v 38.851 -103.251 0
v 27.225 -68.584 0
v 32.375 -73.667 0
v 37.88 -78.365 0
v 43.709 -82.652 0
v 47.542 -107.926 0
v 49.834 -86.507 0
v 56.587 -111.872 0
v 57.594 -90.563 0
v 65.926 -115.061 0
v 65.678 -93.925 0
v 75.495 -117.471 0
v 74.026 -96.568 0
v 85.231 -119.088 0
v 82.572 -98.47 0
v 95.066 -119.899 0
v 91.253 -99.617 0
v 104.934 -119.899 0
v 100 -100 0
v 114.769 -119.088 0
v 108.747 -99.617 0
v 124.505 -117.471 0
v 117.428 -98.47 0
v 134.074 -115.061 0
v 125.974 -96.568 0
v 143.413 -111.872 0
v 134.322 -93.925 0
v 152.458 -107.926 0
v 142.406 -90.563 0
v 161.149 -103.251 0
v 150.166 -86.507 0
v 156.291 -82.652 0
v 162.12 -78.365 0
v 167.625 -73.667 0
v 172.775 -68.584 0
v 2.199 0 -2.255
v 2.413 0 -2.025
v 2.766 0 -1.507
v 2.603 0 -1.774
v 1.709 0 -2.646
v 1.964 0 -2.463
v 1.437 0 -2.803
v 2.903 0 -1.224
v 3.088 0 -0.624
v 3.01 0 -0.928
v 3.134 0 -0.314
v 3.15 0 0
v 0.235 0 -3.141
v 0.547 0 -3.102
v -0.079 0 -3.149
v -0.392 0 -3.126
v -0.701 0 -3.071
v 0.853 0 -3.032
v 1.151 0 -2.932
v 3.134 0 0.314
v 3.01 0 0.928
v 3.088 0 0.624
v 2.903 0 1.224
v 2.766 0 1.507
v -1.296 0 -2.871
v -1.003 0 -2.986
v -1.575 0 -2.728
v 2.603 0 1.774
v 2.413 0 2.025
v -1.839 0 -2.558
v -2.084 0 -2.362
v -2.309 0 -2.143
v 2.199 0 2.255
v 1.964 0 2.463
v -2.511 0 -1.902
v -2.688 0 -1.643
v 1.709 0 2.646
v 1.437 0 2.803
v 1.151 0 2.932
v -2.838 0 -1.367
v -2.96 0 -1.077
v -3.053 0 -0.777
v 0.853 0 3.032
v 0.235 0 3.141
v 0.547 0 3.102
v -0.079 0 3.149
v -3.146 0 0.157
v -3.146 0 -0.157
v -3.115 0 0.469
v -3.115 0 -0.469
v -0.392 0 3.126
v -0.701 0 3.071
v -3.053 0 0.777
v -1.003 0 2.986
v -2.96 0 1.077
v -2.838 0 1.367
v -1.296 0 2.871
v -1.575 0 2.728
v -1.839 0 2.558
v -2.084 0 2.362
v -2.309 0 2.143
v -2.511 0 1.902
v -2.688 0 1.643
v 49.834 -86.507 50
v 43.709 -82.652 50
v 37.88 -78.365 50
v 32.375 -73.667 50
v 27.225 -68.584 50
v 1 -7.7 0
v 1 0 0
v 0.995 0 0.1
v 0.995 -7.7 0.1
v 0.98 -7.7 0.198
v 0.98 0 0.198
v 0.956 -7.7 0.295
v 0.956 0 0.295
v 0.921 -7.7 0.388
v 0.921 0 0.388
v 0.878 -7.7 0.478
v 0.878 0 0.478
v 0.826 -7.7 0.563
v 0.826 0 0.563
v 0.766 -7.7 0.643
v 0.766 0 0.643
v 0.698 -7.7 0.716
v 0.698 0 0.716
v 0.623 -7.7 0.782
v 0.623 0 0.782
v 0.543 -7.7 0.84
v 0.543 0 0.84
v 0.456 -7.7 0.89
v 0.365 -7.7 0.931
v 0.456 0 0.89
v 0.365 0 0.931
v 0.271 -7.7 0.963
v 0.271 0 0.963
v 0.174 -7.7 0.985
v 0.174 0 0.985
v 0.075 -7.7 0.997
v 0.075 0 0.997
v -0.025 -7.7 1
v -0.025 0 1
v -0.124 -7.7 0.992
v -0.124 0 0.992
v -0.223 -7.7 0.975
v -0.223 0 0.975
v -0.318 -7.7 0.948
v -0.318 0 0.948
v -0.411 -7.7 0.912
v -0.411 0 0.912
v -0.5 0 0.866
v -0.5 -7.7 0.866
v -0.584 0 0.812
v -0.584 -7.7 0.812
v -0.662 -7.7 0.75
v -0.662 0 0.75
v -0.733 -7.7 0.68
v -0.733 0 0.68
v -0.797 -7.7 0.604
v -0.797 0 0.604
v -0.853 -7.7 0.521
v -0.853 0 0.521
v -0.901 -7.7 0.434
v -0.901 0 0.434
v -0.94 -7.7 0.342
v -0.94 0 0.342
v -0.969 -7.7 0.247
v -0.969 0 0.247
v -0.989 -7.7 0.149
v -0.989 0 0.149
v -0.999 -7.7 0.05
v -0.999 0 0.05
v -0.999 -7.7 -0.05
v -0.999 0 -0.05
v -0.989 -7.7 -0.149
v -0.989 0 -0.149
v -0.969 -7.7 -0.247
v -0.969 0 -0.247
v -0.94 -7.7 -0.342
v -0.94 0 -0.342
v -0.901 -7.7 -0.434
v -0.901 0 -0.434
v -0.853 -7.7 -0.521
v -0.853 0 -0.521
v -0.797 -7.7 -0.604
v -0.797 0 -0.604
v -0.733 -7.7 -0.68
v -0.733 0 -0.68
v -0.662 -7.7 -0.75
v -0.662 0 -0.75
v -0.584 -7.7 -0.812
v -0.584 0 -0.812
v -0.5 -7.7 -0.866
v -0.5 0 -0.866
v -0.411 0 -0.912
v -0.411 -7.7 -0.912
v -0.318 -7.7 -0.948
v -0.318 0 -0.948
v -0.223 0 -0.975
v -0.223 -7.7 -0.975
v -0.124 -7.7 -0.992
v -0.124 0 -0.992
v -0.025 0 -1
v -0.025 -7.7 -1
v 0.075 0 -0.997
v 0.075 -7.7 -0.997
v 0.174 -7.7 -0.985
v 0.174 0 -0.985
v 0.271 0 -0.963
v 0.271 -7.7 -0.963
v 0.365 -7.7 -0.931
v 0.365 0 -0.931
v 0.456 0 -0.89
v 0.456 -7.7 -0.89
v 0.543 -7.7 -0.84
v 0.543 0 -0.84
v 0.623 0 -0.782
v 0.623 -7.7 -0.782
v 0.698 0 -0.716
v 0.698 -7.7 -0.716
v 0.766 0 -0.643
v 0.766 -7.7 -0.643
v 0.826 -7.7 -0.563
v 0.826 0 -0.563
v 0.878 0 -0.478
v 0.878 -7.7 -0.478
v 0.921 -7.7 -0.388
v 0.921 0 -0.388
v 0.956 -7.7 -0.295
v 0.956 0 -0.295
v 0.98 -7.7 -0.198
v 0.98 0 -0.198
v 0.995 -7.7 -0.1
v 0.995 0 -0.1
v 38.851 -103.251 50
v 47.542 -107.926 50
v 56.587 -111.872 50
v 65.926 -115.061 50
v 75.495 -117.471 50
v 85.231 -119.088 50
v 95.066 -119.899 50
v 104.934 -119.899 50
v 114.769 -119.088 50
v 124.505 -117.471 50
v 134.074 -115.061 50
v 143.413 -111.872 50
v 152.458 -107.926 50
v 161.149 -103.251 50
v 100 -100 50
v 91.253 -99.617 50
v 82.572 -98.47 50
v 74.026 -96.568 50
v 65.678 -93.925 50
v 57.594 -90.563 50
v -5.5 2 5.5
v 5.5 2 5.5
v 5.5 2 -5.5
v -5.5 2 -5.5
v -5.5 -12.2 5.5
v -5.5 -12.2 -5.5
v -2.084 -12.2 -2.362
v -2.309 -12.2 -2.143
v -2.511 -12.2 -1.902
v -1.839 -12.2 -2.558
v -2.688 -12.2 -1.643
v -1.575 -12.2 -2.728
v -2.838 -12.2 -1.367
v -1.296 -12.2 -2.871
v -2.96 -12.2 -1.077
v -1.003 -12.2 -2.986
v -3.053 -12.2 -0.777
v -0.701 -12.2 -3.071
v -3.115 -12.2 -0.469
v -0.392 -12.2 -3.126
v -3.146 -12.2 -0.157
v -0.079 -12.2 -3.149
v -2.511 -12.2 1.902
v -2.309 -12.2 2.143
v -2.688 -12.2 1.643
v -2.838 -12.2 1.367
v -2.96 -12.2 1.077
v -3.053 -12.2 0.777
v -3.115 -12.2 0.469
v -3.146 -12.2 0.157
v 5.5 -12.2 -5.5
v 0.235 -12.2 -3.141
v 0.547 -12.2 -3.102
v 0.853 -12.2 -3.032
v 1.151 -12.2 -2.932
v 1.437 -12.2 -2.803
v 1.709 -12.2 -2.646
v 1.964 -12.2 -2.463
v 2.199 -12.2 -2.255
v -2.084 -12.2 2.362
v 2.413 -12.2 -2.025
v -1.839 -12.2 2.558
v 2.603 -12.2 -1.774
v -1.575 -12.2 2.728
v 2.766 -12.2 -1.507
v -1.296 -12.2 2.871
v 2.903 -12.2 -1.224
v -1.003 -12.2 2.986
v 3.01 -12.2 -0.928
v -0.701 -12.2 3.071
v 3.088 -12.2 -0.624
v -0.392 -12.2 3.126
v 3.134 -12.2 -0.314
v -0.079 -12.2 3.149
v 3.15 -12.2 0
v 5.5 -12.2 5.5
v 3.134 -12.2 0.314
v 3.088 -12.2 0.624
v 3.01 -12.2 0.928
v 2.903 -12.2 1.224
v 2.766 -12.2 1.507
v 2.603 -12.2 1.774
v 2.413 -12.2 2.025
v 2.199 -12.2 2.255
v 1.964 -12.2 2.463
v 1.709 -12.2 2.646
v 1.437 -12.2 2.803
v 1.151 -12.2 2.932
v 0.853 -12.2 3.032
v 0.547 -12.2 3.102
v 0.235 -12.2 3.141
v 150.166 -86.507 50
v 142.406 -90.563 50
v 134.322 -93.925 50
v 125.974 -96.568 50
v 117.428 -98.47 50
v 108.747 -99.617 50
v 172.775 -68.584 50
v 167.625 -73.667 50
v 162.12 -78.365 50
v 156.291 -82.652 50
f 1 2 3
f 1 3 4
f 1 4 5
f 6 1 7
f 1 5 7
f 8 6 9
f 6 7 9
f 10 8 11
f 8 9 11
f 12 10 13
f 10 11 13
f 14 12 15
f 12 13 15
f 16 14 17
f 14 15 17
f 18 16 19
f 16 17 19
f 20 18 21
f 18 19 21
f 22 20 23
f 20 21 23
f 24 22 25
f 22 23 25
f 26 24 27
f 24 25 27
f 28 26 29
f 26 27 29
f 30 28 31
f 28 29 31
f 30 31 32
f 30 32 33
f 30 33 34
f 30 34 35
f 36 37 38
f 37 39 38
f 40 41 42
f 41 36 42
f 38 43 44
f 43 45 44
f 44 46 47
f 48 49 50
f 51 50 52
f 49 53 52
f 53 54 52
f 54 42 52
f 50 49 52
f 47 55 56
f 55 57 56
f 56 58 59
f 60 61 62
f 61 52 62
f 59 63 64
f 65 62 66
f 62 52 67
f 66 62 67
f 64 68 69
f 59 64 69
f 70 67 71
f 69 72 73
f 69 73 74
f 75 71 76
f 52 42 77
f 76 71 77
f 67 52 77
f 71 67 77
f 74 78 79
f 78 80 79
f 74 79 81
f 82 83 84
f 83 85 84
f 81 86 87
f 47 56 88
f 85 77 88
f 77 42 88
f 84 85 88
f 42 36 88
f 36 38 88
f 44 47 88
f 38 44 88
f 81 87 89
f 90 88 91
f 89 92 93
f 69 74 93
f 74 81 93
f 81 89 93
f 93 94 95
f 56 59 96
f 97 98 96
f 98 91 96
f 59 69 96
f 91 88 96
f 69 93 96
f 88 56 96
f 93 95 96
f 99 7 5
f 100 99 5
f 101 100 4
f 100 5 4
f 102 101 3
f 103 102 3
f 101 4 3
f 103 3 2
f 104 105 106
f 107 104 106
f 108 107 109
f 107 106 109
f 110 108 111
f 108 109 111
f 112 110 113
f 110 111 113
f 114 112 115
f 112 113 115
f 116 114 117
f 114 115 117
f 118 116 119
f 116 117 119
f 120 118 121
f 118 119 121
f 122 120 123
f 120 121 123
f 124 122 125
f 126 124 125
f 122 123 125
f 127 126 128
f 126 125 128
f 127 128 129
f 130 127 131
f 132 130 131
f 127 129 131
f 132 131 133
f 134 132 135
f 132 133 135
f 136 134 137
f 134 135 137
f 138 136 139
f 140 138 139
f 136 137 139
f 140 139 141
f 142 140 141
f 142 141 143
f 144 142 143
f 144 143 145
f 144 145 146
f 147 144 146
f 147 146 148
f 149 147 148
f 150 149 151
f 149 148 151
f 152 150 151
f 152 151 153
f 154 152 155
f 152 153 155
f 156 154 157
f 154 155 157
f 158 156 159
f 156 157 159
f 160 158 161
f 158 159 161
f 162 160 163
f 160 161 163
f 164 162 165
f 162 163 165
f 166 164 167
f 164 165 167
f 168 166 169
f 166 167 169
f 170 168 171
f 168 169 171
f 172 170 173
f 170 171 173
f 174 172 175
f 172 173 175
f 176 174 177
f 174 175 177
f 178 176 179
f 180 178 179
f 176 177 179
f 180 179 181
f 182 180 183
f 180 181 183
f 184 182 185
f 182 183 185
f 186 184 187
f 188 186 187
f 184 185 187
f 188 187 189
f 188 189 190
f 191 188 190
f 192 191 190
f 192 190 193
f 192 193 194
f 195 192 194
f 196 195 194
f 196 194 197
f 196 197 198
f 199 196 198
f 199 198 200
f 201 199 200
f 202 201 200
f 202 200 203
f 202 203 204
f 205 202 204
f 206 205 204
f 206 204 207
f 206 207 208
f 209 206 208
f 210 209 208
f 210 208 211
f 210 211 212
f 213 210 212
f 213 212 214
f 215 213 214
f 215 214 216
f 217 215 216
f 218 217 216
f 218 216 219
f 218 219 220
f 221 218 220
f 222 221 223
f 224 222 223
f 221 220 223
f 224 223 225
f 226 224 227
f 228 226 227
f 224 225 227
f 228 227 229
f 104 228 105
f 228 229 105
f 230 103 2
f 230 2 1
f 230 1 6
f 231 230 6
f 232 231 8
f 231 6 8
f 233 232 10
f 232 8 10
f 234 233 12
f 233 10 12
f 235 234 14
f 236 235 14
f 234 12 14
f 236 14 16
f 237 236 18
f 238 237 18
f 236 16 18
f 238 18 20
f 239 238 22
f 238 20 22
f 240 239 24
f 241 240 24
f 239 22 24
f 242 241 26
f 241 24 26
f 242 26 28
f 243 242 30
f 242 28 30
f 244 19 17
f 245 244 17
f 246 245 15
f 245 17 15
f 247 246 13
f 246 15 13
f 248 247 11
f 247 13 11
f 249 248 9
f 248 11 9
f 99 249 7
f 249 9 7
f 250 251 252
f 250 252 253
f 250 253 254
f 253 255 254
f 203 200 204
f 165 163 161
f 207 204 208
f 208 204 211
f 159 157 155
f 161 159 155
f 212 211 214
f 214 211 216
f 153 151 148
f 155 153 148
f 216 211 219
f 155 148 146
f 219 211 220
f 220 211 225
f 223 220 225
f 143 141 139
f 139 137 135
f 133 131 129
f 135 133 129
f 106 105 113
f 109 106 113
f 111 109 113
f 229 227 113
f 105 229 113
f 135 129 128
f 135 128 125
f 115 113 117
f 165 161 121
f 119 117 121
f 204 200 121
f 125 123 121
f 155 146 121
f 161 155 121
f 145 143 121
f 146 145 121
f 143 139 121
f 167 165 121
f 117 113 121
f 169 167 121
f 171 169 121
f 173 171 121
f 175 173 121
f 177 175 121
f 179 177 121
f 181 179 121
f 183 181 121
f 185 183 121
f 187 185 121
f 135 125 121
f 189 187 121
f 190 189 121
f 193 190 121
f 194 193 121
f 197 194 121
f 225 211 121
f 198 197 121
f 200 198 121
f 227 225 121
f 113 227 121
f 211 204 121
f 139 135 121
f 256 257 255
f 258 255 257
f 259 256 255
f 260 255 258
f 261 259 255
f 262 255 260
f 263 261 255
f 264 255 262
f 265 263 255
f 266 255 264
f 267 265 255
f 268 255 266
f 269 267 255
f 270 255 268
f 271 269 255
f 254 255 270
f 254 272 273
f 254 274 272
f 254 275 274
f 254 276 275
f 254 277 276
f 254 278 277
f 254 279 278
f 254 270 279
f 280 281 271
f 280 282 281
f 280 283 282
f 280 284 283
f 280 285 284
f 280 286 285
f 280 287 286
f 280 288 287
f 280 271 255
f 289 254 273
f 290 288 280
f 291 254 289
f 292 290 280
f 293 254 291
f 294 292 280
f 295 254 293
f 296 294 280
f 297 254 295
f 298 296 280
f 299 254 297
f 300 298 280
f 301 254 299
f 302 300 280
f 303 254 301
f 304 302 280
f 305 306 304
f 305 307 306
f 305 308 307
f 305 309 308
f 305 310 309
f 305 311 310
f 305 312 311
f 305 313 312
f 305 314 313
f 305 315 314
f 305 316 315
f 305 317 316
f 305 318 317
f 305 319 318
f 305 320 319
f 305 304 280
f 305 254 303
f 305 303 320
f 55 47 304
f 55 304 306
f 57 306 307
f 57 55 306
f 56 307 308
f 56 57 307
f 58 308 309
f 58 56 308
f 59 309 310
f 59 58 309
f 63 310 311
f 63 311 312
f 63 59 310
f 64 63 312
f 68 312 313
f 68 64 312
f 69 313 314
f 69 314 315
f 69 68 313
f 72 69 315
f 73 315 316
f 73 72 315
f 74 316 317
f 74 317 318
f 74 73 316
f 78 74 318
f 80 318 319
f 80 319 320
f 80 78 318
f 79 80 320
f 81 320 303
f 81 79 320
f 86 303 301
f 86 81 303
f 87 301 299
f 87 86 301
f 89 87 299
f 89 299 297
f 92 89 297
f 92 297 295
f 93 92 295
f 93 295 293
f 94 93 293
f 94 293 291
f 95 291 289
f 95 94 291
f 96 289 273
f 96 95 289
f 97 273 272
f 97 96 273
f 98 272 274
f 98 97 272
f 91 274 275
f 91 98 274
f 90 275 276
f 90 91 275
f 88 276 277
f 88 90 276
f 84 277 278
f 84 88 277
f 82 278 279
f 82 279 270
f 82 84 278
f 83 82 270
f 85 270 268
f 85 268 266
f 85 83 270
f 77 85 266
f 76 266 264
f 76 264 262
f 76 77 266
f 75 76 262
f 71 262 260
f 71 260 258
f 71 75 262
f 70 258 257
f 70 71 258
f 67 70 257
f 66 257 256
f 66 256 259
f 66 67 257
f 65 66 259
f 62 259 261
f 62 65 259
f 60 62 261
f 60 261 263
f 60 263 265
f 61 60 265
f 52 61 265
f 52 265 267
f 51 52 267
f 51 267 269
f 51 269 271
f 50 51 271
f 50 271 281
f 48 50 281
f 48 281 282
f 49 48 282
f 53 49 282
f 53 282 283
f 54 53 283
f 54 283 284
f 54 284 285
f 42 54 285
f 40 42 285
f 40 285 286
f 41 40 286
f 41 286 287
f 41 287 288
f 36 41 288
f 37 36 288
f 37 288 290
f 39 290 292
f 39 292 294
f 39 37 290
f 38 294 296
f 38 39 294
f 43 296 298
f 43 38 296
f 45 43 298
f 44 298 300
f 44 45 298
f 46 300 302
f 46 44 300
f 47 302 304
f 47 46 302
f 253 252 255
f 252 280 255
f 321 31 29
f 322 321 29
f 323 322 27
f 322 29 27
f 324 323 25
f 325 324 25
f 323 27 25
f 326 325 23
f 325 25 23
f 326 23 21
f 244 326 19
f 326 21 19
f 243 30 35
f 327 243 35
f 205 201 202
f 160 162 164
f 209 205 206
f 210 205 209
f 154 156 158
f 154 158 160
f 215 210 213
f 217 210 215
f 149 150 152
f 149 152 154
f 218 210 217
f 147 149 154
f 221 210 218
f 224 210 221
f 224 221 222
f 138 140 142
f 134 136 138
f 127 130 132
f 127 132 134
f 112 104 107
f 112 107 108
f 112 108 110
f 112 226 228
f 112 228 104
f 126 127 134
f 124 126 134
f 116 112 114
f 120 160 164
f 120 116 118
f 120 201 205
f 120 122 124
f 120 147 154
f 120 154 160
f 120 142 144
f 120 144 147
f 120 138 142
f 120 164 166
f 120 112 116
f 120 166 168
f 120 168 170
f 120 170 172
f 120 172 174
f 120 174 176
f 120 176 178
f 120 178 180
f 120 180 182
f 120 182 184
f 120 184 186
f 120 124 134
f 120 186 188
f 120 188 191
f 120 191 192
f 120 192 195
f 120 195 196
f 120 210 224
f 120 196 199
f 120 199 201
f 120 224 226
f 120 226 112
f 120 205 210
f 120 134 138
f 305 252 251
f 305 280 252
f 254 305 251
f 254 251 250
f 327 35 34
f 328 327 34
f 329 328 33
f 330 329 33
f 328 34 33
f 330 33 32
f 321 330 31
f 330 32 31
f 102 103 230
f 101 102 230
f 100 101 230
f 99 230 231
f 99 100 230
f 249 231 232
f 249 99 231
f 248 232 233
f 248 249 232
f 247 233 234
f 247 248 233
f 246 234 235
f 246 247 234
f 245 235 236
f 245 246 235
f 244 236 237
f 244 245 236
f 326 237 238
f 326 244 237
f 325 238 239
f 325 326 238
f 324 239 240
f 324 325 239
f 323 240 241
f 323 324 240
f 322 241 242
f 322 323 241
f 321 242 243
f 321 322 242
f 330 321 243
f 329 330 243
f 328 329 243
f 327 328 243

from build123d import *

# Parameters (mm, degrees)
F1_DEPTH = 50
F2_W     = 11
F2_H     = 11
F2_R     = 3.15
F3_DEPTH = 12.2
F4_W     = 11
F4_H     = 11
F5_DEPTH = 2
F6_R     = 1
F7_DEPTH = 7.7


with BuildPart() as f1:
    # F0 (on Top) → F1 (new body)
    with BuildSketch(Plane.XY):
        with BuildLine():
            ThreePointArc((49.834151, -86.506575), (37.879607, -78.364895), (27.22461, -68.583836))
            Line((27.22461, -68.583836), (38.850873, -103.251074))
            Line((38.850873, -103.251074), (49.834151, -86.506575))
        make_face()
        with BuildLine():
            ThreePointArc((100, -100), (74.025566, -96.567742), (49.834151, -86.506575))
            Line((49.834151, -86.506575), (38.850873, -103.251074))
            ThreePointArc((38.850873, -103.251074), (100, -120), (161.149127, -103.251074))
            Line((161.149127, -103.251074), (150.165849, -86.506575))
            ThreePointArc((150.165849, -86.506575), (125.974434, -96.567742), (100, -100))
        make_face()
        with BuildLine():
            Line((150.165849, -86.506575), (161.149127, -103.251074))
            Line((161.149127, -103.251074), (172.77539, -68.583836))
            ThreePointArc((172.77539, -68.583836), (162.120393, -78.364895), (150.165849, -86.506575))
        make_face()
    extrude(amount=F1_DEPTH)


with BuildPart() as f3:
    # F2 (on Front) → F3 (new body)
    with BuildSketch(Plane.XZ):
        Rectangle(F2_W, F2_H)
        Circle(F2_R, mode=Mode.SUBTRACT)
    extrude(amount=F3_DEPTH)

    # F4 (on face) → F5 (join)
    with BuildSketch(Plane(origin=(0, 0, 0), x_dir=(-1, 0, 0), z_dir=(0, 1, 0))):
        Rectangle(F4_W, F4_H)
    extrude(amount=F5_DEPTH)


with BuildPart() as f7:
    # F6 (on face) → F7 (new body)
    with BuildSketch(Plane.XZ):
        Circle(F6_R)
    extrude(amount=F7_DEPTH)


solid = Compound([f1.part, f3.part, f7.part])
